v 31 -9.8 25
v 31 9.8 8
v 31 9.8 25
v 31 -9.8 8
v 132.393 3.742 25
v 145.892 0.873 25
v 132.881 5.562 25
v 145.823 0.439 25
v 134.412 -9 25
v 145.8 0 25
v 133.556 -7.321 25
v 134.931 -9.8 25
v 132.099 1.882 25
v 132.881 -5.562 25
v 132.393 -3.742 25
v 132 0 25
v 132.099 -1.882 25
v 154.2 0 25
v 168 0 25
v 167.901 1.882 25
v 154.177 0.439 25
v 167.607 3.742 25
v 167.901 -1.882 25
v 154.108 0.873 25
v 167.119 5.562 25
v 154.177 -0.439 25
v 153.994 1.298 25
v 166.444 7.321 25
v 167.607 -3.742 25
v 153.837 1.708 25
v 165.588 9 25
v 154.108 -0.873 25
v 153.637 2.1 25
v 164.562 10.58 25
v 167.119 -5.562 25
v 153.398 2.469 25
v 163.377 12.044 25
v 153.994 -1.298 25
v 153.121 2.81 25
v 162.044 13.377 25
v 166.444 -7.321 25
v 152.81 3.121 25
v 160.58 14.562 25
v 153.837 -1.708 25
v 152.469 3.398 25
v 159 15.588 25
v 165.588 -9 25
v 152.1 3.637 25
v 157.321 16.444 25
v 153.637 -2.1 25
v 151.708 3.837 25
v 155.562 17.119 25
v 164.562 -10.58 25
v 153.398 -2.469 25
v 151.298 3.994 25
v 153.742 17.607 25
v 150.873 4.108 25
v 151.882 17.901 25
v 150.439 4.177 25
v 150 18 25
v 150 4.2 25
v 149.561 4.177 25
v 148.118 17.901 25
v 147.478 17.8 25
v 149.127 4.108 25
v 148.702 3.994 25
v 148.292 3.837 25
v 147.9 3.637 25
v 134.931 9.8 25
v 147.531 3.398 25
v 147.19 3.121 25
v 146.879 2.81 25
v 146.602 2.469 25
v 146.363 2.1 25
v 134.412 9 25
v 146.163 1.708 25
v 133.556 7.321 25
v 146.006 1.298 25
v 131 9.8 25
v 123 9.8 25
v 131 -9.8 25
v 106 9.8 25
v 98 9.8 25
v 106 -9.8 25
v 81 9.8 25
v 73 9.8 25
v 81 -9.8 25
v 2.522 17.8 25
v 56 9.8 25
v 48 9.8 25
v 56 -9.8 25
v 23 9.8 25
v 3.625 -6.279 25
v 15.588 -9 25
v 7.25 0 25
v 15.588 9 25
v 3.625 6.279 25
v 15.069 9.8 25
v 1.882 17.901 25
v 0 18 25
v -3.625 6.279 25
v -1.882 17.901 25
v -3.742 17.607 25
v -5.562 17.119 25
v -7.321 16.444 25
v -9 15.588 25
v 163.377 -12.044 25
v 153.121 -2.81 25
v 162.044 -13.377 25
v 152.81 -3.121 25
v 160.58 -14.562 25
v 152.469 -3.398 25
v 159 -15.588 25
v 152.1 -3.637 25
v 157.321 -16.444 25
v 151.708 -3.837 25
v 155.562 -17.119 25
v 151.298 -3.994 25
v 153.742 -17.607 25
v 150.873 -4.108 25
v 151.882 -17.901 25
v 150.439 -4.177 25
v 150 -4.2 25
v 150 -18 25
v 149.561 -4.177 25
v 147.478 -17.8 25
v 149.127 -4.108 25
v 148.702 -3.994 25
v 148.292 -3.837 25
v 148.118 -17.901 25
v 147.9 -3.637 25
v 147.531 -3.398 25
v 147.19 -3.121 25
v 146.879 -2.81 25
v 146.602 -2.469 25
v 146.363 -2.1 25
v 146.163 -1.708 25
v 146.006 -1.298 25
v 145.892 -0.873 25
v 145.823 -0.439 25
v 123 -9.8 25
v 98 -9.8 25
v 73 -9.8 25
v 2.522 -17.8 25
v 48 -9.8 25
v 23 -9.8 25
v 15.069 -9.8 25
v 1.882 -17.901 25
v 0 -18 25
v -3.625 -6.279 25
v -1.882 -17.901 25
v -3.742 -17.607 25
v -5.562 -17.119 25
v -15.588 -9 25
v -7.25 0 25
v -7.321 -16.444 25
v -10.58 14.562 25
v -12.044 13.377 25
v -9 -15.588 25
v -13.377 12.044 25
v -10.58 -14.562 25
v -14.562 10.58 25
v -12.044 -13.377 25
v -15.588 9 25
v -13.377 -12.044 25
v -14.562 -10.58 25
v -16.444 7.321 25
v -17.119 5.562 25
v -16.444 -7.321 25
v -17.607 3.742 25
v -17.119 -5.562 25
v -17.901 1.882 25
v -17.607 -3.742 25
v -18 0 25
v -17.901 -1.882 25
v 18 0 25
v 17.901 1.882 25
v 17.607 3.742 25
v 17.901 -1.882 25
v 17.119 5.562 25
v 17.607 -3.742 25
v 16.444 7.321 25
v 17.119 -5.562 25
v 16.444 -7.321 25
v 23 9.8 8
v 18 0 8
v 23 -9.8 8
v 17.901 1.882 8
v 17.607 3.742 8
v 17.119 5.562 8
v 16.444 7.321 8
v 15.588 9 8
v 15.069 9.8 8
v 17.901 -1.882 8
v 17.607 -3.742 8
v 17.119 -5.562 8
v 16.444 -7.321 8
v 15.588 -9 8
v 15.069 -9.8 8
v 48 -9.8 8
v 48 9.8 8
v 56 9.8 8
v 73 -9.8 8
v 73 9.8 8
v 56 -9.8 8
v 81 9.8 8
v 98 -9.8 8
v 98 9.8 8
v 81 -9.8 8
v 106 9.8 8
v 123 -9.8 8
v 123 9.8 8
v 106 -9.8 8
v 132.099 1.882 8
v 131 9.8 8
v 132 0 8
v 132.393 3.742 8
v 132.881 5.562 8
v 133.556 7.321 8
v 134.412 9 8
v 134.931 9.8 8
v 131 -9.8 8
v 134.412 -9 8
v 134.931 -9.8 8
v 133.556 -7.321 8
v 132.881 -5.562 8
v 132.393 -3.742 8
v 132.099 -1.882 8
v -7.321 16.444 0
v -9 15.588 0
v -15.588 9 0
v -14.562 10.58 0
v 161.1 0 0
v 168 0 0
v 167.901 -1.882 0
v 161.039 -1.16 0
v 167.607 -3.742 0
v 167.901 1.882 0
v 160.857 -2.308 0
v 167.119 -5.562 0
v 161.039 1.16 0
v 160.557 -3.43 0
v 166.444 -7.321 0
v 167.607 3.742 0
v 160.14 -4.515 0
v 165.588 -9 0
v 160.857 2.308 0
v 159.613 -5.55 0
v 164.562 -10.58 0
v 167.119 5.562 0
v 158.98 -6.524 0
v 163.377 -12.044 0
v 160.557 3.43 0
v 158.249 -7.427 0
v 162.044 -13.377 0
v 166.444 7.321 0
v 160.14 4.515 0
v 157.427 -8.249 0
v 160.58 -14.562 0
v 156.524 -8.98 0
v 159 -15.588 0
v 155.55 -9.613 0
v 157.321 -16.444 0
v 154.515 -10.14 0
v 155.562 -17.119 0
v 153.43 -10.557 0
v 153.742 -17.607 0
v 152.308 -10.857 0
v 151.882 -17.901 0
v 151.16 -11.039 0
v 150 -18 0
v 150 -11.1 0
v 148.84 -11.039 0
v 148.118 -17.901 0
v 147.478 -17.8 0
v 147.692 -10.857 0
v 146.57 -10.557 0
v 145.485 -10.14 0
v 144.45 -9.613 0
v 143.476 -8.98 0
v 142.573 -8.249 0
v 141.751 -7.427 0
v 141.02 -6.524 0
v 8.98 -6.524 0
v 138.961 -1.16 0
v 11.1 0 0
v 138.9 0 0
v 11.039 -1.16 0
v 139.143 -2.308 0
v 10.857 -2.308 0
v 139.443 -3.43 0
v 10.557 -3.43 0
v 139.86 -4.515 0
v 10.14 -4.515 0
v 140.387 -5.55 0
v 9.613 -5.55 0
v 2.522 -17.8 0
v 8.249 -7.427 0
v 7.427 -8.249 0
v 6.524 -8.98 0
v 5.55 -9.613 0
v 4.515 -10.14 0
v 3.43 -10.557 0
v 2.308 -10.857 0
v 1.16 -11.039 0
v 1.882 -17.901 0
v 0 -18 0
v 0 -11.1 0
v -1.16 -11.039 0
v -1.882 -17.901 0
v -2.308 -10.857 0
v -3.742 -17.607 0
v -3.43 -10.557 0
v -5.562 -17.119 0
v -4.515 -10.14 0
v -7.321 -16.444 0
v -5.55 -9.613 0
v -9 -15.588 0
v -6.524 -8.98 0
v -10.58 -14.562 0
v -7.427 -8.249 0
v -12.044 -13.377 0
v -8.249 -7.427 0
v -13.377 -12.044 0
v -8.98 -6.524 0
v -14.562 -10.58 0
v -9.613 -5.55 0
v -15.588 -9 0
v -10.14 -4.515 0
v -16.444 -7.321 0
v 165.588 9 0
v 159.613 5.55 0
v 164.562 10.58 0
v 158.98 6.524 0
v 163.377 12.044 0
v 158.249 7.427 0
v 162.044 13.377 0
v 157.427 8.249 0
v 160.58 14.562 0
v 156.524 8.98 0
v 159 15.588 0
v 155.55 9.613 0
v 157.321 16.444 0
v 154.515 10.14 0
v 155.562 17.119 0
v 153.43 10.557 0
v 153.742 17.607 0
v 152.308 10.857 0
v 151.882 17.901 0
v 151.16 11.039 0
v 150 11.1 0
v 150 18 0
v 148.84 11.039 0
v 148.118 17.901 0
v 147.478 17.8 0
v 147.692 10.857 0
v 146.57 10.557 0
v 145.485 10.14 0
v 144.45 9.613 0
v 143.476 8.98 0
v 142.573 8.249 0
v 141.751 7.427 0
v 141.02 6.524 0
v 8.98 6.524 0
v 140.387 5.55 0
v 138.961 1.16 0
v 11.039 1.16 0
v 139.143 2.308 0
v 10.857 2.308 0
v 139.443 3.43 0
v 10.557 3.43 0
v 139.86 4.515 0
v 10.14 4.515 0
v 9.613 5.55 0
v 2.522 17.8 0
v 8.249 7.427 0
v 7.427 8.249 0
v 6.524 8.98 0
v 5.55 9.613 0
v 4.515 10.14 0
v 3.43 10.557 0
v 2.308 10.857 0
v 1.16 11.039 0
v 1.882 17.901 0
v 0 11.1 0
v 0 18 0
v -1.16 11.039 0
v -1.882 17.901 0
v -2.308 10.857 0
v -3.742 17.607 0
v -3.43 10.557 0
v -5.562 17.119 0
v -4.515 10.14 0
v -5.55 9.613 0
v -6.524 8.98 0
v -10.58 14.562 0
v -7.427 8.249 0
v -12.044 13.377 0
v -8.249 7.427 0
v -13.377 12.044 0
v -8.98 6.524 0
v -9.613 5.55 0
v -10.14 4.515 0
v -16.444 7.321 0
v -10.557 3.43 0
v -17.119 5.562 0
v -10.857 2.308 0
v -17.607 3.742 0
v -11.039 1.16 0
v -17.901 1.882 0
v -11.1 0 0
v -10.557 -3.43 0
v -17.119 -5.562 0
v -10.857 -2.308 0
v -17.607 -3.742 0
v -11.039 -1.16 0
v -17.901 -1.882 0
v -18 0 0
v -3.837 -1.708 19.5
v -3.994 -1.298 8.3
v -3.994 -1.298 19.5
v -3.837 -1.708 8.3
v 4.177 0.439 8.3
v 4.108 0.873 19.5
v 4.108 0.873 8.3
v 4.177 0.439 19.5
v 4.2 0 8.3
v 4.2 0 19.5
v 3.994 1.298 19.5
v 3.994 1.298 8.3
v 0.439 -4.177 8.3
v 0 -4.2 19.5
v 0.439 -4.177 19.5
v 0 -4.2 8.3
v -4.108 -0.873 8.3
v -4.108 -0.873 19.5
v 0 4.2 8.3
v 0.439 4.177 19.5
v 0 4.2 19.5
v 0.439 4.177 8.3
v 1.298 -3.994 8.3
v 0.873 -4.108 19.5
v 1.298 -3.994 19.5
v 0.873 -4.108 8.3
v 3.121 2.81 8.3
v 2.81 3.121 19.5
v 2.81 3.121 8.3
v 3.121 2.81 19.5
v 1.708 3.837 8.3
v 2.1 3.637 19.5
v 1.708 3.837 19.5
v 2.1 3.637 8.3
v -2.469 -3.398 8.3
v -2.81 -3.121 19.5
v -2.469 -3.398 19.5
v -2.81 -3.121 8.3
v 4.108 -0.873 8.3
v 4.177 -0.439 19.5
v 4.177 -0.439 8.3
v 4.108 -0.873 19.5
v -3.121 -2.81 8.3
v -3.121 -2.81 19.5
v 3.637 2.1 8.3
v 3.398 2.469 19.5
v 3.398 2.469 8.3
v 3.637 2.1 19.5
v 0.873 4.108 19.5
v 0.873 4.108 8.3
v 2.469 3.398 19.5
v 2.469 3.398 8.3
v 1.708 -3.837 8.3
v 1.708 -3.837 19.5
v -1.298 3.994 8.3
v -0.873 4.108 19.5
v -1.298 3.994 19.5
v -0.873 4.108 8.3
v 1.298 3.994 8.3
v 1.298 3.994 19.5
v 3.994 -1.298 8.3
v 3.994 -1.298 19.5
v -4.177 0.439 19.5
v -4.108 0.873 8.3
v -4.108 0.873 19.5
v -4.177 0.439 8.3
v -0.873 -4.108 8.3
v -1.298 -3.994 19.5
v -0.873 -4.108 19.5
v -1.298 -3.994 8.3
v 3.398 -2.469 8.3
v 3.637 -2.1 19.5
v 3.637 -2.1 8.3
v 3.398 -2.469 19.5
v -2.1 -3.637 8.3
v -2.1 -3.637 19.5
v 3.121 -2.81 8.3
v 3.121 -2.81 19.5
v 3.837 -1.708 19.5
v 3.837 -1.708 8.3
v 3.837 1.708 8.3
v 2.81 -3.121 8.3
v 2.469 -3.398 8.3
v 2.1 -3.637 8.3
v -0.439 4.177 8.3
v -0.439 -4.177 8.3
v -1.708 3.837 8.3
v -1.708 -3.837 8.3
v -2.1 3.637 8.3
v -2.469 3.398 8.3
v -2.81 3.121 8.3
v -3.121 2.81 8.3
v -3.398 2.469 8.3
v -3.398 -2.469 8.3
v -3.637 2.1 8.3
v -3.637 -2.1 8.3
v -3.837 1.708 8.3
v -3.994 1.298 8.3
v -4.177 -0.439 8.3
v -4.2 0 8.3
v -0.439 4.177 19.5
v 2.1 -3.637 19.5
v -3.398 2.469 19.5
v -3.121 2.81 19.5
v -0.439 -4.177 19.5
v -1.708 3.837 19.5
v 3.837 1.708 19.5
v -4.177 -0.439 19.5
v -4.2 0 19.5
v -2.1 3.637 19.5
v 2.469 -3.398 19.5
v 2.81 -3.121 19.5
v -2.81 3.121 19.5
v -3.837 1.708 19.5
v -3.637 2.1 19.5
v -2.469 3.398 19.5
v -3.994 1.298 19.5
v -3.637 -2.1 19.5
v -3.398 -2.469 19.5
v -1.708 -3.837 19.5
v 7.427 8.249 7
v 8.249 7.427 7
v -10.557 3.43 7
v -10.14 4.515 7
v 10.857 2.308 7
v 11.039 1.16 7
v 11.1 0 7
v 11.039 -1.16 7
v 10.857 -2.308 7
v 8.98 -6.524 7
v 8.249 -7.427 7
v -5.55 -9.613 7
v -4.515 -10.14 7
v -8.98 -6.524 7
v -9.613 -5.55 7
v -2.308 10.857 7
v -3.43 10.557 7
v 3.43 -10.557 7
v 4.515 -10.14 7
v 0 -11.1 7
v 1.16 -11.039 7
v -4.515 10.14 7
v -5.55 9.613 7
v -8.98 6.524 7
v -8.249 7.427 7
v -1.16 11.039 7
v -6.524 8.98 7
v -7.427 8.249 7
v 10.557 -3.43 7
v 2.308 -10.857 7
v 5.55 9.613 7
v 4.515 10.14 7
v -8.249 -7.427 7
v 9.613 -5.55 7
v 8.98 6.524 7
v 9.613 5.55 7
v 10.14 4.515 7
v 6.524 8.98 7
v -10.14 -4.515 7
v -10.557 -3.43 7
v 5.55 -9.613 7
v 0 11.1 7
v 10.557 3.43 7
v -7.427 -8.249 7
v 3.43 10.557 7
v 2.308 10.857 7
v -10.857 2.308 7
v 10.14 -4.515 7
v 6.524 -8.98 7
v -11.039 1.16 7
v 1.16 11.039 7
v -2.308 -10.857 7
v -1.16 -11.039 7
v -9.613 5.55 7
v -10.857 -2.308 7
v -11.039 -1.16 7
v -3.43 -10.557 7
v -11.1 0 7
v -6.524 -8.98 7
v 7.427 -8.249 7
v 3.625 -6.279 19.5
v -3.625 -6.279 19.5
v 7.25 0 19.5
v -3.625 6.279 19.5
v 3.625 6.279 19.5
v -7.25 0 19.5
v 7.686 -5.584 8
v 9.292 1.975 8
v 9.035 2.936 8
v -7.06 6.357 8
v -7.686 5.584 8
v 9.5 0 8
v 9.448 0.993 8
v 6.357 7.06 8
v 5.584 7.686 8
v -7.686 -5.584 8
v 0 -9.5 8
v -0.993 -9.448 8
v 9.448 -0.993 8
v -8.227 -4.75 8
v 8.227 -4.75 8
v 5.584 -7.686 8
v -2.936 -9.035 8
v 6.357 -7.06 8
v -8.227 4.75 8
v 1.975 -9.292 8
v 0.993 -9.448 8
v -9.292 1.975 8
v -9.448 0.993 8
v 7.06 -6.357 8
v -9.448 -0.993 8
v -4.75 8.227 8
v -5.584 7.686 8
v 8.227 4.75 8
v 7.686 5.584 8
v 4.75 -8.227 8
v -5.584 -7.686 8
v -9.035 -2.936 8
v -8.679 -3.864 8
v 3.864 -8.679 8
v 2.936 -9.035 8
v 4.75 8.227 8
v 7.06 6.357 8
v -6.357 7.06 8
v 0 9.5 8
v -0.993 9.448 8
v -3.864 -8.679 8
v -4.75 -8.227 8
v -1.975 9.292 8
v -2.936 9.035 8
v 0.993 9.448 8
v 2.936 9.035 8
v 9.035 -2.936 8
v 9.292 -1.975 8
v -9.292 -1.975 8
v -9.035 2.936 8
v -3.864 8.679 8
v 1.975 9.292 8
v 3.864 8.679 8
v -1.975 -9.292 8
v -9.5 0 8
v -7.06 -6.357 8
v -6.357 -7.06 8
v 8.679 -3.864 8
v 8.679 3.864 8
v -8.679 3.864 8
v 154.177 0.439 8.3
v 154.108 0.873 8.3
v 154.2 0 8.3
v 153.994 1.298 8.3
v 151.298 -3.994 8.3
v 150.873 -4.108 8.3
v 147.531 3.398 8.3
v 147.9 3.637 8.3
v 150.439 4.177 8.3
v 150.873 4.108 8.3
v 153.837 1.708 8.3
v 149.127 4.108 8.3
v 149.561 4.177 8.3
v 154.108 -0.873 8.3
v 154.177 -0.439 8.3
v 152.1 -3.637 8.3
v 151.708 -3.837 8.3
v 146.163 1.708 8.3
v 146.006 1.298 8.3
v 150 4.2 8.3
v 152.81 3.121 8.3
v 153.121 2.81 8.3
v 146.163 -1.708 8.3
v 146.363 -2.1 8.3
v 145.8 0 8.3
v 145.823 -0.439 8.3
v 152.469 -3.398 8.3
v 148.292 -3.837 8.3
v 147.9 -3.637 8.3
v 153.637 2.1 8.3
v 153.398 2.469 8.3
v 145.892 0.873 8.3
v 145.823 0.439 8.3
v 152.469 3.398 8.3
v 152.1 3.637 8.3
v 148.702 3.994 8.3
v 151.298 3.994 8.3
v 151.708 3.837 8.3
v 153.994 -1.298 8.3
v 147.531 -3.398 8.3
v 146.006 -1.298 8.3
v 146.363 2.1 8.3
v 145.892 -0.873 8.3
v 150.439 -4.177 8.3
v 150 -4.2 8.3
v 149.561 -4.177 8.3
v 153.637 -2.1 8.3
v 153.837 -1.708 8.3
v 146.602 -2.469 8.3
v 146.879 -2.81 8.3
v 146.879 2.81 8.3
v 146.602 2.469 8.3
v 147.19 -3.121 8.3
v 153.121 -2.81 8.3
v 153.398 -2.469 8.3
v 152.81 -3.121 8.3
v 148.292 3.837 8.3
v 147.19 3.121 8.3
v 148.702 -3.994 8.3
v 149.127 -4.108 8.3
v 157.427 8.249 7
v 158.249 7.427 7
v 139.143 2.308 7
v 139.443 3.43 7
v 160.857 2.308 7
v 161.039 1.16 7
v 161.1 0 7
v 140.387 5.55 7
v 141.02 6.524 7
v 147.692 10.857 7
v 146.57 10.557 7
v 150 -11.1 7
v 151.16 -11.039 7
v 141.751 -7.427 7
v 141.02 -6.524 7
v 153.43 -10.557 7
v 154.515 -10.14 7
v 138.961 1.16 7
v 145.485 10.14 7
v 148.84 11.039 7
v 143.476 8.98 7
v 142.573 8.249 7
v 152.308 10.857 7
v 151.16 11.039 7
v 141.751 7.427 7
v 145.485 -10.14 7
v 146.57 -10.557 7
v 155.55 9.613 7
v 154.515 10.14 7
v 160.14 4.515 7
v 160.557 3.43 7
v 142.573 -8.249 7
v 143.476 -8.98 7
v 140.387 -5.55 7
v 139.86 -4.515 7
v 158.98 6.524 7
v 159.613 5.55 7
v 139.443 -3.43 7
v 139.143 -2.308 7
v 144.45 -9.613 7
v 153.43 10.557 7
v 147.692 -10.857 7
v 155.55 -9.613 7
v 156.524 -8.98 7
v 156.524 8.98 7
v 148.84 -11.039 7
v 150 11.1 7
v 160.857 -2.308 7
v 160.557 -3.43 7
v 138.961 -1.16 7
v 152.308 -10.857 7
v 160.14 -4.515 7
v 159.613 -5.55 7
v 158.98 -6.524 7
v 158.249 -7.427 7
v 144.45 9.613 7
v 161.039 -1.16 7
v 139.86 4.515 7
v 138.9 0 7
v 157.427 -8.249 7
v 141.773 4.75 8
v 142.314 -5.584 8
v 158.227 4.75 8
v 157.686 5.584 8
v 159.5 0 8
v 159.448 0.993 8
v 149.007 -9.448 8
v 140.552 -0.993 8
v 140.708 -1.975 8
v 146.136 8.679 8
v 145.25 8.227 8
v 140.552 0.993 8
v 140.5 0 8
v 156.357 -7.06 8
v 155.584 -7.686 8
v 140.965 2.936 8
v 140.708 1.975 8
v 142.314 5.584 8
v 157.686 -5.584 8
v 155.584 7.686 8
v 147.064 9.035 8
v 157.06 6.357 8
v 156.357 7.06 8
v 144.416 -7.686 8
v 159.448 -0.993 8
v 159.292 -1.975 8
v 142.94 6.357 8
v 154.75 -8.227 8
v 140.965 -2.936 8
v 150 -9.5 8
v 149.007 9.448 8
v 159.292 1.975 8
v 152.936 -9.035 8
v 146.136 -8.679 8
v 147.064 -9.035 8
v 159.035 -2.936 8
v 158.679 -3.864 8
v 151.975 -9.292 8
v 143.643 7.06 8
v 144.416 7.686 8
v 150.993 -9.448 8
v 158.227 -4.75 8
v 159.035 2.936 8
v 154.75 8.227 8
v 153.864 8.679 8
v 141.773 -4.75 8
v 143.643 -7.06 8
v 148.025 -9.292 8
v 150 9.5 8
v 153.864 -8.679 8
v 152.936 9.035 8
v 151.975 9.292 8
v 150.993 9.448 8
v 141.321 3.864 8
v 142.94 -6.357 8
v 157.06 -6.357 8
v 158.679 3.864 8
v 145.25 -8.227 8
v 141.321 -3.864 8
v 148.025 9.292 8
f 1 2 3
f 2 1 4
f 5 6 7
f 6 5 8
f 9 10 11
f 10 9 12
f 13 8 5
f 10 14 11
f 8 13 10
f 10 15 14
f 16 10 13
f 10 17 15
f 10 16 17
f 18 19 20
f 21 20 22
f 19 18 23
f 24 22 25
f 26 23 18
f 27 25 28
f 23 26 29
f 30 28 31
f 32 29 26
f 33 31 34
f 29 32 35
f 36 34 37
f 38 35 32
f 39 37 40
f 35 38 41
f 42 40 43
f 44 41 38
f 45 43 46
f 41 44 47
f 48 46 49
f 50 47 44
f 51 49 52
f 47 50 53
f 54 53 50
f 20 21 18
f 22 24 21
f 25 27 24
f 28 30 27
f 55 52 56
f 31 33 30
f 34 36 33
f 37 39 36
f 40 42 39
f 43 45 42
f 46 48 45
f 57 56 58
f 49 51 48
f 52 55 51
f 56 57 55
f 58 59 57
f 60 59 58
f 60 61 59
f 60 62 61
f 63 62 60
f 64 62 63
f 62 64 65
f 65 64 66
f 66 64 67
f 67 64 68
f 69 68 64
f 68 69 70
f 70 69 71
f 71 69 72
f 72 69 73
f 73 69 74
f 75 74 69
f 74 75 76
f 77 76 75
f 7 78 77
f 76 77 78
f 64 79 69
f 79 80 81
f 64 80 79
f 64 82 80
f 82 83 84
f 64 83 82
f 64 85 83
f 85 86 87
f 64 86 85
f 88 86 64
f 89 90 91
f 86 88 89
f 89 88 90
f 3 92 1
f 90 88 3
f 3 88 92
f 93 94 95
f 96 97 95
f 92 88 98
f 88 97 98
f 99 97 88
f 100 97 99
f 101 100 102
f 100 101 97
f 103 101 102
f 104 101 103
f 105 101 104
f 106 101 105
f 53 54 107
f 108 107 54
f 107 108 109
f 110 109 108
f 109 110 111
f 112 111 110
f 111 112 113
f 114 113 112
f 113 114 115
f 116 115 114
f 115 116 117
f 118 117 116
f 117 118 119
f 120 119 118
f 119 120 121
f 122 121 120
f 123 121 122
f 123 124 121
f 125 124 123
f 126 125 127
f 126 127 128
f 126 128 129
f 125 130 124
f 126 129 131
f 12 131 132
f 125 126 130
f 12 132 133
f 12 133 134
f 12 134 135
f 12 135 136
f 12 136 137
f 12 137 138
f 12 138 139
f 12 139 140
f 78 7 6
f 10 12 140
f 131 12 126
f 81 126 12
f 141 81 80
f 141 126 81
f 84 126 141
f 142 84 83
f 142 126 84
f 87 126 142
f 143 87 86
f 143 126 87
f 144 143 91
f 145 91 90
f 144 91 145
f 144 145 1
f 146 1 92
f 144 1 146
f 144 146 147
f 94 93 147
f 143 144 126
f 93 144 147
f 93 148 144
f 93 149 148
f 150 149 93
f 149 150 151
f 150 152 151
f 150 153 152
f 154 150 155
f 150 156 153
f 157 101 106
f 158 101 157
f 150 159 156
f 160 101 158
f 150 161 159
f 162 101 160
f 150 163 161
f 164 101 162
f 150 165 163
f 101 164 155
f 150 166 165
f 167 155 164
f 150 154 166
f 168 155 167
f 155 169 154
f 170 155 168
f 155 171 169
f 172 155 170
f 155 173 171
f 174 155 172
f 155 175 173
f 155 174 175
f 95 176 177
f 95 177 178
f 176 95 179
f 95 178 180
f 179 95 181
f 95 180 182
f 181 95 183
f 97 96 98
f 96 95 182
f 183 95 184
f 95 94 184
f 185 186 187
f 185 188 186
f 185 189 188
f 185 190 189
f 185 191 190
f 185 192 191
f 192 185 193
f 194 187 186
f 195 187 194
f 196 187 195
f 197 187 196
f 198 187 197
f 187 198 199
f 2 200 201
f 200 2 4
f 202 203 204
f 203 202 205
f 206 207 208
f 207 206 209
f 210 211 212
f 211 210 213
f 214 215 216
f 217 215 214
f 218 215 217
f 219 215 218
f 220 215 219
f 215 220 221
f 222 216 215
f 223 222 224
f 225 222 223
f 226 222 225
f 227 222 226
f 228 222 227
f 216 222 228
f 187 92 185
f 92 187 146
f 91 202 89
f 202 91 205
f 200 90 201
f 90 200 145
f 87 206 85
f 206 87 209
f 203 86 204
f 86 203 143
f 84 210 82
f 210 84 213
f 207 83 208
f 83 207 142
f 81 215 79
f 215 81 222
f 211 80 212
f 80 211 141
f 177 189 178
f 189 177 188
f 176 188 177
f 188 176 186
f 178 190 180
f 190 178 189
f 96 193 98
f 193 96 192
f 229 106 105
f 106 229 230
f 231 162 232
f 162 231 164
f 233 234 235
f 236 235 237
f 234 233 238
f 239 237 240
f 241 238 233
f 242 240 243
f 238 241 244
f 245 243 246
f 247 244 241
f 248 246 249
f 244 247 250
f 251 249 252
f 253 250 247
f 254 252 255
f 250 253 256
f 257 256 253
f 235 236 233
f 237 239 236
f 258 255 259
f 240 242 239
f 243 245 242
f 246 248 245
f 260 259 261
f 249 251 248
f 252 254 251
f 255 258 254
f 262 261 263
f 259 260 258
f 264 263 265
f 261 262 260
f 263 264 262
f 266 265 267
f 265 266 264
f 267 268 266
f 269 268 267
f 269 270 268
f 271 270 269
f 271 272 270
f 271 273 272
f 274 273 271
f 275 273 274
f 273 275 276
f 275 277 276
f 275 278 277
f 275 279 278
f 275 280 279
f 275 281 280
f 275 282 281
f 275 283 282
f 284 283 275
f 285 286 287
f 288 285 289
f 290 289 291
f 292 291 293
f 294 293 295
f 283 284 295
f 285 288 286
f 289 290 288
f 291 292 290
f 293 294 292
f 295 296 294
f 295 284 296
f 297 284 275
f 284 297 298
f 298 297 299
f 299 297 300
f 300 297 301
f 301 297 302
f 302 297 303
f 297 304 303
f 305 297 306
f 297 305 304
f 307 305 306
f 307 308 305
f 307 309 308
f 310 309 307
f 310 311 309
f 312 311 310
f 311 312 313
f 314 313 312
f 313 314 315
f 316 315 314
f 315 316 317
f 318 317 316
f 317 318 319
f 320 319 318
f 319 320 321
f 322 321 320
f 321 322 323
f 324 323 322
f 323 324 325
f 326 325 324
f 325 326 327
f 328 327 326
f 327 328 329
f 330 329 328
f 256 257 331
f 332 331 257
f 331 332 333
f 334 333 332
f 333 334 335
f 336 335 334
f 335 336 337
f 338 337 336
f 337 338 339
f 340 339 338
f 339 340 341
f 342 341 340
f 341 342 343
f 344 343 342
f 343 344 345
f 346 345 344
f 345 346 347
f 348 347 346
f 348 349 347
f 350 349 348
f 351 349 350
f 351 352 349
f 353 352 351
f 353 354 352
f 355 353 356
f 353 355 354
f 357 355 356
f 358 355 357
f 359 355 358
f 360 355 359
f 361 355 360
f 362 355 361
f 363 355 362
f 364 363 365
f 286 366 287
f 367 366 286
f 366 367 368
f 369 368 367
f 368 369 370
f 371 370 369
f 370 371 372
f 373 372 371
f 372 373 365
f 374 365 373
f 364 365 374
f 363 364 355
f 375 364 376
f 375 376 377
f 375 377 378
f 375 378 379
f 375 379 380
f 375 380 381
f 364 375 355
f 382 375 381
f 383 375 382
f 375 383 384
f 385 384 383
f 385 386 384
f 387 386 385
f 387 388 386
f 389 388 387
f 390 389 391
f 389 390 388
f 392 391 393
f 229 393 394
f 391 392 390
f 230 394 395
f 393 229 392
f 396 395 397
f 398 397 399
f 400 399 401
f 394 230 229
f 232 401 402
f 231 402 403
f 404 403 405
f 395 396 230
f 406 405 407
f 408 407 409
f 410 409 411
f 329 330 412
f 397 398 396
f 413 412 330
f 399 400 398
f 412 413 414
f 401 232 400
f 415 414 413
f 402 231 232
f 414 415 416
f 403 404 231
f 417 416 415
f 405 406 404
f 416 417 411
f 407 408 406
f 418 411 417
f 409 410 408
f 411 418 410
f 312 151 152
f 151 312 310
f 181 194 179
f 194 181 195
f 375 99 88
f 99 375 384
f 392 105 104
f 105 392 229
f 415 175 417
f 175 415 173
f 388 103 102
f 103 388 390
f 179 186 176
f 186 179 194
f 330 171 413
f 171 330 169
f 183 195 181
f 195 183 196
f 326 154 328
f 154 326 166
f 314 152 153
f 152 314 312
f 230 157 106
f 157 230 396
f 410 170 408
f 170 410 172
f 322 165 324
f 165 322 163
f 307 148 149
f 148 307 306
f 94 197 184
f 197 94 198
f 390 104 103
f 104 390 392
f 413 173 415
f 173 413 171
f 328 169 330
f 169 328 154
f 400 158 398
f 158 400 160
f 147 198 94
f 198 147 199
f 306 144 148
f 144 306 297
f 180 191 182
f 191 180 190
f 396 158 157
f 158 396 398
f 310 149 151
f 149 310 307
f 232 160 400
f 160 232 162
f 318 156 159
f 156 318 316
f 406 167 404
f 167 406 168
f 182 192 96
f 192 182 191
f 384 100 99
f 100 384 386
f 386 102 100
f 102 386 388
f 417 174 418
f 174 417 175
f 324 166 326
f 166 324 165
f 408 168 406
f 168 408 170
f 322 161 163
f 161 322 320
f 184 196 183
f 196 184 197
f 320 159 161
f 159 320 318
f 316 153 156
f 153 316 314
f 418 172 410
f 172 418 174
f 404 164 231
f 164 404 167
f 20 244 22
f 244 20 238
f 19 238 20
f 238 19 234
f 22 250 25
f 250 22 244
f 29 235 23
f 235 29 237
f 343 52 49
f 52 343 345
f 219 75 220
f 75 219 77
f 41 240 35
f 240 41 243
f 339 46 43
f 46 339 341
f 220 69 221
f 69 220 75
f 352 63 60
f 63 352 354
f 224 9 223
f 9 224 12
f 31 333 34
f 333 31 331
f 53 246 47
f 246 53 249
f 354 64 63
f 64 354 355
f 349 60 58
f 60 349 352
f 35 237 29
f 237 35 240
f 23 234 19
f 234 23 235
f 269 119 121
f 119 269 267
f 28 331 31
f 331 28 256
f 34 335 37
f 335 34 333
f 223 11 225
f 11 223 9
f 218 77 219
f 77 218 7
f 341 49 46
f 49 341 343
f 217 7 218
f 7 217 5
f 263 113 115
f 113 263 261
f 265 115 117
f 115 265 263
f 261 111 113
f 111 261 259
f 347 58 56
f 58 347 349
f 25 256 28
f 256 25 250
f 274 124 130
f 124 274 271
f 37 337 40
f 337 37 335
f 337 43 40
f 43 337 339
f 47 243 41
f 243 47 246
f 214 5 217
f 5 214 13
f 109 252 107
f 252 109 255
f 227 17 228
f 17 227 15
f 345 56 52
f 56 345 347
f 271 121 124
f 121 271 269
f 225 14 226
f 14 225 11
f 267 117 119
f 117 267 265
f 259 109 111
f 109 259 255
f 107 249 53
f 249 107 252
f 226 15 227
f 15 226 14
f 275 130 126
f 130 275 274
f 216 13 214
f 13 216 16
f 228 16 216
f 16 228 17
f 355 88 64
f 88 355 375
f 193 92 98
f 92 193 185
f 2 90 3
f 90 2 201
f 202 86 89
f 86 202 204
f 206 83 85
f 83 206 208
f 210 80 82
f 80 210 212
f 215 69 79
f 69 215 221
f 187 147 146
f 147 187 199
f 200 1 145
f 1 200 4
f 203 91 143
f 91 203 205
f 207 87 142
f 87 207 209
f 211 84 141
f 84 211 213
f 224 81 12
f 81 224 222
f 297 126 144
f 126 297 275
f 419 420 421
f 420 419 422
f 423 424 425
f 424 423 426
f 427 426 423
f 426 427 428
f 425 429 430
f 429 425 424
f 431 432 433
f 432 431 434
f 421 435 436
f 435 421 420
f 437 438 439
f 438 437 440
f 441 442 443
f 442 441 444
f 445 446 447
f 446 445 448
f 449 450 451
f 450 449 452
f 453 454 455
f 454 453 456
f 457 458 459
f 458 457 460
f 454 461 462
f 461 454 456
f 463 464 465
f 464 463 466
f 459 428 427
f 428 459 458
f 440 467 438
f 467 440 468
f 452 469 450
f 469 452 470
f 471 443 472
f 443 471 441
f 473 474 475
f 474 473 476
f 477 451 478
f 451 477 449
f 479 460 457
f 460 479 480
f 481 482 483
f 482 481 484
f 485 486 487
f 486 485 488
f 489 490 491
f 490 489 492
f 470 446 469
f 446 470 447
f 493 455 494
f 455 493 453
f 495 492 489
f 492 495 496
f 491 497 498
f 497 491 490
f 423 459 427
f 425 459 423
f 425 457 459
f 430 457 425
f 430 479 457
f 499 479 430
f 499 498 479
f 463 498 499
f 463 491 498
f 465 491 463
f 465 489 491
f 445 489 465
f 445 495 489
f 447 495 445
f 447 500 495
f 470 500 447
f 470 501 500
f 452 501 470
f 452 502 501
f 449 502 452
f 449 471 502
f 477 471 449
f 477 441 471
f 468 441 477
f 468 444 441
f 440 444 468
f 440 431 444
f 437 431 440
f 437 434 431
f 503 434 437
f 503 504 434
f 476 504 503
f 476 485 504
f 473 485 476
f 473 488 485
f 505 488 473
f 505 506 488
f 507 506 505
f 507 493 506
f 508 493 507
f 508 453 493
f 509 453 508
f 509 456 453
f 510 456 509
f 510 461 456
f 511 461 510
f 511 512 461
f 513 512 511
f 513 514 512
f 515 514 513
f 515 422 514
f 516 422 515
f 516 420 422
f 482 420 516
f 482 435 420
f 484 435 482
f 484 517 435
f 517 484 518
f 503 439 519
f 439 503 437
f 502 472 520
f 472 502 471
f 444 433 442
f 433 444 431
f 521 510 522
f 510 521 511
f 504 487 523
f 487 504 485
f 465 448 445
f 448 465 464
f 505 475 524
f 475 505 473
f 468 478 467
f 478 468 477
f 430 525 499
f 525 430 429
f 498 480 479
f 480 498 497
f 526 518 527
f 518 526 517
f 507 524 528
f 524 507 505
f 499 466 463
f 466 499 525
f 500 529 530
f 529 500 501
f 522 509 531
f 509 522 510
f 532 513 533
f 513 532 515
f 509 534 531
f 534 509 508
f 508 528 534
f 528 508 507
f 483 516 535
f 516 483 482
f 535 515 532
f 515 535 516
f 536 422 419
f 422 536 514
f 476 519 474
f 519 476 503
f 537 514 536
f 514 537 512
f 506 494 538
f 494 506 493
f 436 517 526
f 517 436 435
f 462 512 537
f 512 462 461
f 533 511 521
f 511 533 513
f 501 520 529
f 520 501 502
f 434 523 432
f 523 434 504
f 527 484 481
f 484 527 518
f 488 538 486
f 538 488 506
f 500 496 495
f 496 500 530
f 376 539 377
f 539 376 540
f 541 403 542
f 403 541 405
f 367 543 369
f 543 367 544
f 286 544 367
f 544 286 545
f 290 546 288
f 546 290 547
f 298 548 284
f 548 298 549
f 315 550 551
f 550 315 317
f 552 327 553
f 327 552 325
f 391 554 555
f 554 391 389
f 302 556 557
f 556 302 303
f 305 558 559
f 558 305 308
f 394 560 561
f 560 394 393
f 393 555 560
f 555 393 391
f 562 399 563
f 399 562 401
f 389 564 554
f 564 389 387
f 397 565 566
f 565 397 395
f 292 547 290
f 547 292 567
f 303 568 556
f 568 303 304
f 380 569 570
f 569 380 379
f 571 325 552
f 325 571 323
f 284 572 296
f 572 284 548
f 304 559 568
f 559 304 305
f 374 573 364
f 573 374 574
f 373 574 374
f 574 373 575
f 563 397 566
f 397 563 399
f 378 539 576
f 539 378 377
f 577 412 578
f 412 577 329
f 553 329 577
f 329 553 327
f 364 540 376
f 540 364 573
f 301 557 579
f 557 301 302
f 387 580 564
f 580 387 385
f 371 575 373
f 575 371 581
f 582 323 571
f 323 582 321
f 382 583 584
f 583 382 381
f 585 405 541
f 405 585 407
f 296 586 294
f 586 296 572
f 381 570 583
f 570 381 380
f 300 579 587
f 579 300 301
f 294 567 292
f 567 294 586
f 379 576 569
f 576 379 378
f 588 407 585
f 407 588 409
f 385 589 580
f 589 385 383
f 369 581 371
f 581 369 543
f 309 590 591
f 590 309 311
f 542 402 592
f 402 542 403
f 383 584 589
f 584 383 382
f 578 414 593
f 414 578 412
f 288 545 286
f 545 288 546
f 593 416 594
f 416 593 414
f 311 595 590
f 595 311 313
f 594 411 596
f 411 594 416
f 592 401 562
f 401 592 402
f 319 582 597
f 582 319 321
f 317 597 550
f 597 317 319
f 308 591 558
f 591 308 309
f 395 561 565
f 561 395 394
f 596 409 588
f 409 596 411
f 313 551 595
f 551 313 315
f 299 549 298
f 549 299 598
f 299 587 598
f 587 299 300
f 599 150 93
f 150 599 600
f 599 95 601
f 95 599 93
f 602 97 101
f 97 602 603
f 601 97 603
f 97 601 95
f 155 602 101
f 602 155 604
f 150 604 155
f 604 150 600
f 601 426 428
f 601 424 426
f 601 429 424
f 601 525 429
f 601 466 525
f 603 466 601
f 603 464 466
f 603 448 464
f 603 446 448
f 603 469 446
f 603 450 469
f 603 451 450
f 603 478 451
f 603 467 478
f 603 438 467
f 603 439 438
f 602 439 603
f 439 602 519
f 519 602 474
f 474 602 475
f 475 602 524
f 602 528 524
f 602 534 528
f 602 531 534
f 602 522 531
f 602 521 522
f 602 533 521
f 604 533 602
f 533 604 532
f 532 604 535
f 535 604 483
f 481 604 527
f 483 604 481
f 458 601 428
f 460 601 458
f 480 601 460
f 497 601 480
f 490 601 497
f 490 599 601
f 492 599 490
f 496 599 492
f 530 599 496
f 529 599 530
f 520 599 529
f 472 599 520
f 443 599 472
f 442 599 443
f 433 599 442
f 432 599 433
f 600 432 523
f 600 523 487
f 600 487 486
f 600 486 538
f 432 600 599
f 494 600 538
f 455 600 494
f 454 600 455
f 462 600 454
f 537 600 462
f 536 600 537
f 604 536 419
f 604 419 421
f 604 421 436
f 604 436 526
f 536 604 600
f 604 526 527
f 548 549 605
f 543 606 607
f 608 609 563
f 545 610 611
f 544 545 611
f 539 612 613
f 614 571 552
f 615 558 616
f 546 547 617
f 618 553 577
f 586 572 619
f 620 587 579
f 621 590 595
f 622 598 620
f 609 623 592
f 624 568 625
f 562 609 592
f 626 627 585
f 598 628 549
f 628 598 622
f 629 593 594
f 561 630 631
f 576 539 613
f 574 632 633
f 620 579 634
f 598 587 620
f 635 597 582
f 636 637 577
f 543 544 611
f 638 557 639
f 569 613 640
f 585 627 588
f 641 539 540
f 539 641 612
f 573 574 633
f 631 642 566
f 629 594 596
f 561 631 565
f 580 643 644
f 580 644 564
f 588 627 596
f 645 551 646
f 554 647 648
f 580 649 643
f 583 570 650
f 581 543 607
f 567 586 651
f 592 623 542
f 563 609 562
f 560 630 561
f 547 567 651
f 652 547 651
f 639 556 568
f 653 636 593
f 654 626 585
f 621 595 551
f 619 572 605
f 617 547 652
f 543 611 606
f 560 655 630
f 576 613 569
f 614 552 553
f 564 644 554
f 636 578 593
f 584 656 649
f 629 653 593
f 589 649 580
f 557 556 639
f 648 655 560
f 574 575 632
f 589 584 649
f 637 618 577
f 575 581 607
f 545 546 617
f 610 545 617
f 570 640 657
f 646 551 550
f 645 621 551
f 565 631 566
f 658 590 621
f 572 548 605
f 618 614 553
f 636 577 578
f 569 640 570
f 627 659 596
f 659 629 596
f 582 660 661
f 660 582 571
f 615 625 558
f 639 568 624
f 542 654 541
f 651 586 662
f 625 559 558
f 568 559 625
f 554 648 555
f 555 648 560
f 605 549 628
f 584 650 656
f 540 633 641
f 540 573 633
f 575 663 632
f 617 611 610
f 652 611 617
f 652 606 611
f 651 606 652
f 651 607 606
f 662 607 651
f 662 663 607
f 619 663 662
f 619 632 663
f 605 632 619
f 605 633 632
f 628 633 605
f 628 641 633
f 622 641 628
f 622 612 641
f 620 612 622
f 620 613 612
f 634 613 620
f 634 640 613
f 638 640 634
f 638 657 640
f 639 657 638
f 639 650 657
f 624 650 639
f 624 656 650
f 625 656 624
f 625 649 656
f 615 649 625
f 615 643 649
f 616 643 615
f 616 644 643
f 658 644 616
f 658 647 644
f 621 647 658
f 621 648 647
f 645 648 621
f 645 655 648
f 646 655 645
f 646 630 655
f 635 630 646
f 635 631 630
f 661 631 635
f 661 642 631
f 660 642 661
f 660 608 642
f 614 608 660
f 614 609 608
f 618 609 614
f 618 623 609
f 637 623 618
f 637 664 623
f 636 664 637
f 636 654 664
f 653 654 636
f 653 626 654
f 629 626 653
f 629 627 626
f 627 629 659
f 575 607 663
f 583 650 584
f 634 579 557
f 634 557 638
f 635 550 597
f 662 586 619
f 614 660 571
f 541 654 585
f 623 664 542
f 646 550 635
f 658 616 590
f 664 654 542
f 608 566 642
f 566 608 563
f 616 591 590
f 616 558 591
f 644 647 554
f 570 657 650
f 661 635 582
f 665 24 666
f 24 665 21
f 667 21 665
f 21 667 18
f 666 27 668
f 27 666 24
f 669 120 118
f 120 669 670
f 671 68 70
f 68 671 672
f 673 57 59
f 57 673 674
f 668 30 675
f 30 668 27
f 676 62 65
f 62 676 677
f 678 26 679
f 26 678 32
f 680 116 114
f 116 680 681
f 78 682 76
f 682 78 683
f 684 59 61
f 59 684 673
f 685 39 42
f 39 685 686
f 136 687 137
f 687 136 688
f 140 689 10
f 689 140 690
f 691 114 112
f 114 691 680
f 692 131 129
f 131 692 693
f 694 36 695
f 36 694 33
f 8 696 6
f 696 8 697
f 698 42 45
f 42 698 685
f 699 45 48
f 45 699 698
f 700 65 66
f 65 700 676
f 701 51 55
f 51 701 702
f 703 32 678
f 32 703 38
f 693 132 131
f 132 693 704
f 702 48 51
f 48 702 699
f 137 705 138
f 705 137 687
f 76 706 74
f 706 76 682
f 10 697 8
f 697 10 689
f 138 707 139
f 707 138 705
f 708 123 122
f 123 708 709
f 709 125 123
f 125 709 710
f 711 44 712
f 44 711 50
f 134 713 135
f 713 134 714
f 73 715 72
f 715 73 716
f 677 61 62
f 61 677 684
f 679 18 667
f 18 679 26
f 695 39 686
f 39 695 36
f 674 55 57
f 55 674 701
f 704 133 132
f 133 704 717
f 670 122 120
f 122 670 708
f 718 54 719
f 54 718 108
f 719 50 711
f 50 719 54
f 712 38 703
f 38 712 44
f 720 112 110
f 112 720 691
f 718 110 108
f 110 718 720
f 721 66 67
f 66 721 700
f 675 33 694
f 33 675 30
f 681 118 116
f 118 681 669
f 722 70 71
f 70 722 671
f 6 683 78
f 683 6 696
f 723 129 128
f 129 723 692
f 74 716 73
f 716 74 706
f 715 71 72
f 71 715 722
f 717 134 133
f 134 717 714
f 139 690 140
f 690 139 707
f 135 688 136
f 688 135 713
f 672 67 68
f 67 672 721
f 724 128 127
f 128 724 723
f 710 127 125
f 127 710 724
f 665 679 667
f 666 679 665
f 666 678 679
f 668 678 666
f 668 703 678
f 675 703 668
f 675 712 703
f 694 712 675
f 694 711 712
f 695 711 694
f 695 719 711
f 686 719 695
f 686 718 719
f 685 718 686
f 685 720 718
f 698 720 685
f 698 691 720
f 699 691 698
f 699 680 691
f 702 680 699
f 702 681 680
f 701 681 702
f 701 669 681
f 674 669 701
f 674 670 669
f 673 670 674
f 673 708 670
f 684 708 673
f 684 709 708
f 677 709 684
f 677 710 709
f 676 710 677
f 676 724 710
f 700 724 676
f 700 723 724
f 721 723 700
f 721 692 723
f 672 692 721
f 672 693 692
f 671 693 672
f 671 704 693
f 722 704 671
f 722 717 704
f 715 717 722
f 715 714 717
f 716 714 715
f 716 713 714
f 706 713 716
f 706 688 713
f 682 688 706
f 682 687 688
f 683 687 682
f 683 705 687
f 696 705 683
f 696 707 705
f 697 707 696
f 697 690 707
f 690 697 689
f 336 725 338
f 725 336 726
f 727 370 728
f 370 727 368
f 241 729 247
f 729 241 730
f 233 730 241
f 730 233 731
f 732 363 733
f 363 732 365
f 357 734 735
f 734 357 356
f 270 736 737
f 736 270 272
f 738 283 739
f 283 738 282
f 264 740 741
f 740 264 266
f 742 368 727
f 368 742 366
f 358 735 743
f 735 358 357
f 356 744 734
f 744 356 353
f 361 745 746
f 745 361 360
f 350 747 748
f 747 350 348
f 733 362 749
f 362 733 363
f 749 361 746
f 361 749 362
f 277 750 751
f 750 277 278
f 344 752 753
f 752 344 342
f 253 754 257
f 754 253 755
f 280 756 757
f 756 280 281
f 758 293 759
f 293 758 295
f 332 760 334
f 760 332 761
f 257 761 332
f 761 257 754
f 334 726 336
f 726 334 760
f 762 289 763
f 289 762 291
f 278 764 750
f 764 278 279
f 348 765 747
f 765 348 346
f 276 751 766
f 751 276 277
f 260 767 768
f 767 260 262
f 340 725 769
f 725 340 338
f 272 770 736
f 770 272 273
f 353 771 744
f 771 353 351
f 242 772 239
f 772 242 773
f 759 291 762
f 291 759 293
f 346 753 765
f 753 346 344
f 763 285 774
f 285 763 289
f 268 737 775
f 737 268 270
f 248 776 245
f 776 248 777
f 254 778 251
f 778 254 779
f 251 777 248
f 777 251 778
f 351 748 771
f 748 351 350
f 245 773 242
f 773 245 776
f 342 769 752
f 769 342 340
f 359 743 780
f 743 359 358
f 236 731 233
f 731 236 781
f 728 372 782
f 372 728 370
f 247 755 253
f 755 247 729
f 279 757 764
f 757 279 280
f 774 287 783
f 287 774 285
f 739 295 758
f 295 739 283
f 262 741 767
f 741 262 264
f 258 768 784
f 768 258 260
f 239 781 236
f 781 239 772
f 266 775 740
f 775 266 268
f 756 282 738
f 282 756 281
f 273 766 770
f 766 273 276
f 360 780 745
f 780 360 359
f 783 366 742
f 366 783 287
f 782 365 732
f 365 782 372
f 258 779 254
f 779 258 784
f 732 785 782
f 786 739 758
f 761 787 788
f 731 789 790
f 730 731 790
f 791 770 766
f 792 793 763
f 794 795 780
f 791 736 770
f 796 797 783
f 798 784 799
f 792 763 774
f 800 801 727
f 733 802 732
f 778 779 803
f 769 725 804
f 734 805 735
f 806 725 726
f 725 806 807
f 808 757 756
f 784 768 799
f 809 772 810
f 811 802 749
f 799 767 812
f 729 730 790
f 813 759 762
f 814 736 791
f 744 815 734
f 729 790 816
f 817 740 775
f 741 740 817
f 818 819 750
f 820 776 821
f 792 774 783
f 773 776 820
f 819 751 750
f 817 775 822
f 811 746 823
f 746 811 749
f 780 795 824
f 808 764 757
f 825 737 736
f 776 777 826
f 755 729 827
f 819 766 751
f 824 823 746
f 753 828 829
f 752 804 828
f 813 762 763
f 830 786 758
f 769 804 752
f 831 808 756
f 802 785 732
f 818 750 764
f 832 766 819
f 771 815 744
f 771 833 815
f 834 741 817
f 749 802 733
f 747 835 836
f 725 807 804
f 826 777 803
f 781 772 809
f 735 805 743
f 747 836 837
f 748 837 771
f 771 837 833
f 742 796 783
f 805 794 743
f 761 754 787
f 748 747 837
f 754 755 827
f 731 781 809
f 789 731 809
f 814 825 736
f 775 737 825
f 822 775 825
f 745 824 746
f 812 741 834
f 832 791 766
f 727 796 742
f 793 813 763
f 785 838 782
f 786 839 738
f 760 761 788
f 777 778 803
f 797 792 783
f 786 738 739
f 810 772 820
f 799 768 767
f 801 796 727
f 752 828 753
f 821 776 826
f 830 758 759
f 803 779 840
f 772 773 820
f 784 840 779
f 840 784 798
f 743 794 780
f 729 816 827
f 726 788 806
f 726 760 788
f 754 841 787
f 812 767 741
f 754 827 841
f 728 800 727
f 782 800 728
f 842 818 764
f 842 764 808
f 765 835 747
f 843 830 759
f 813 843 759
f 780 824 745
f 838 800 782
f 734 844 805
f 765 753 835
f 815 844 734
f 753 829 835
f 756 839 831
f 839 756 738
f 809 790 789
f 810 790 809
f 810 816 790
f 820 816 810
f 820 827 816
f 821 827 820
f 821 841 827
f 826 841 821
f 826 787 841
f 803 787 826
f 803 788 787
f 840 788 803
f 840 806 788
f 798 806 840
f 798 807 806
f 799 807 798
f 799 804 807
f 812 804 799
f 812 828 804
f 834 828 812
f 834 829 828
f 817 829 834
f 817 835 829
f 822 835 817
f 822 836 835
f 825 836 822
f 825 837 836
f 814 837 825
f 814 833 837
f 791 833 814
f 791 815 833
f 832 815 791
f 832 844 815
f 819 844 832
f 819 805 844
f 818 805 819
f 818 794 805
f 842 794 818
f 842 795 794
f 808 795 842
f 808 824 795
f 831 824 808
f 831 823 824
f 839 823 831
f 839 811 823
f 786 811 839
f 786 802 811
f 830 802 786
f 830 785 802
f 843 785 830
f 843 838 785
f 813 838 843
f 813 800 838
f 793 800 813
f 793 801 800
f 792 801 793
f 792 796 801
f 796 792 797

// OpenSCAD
module arm() {
	length=150;
	width=36;
	walls=8;
	difference() {
		union() {
			// rounded ends
			translate([0,0,0]) cylinder(r=width/2,h=25, $fn=60);
			translate([length,0,0]) cylinder(r=width/2,h=25, $fn=60);
			// body
			translate([0,width/2-walls-0.2,0]) cube([length, walls, 25]);
			translate([0,-width/2+0.2,0]) cube([length, walls, 25]);
			for(i=[0:4]) translate([23+25*i,-width/2+walls,walls]) cube([walls, width-(walls*2), 25-walls]);
			translate([0,-width/2+walls,0]) cube([length, width-(walls*2), walls]);
			// bearings
			translate([0,0,0]) cylinder(r=28/2,h=12, $fn=60);
			translate([length,0,0]) cylinder(r=28/2,h=12, $fn=60);
		}
		union() {
			// left holes
			translate([0,0,8.3]) cylinder(r=8.4/2,h=25, $fn=60);
			translate([0,0,-1]) cylinder(r=22.2/2,h=8, $fn=60);
			translate([0,0,25-5.5]) cylinder(r=14.5/2, h=5.5+1, $fn=6);
			translate([0,0,7]) cylinder(r1=22.2/2, r2=19/2,h=1, $fn=60);
			// right holes
			translate([length,0,8.3]) cylinder(r=8.4/2,h=25+2, $fn=60);
			translate([length,0,-1]) cylinder(r=22.2/2,h=8, $fn=60);
			translate([length,0,7]) cylinder(r1=22.2/2, r2=19/2,h=1, $fn=60);
		}
	}
}

arm();
